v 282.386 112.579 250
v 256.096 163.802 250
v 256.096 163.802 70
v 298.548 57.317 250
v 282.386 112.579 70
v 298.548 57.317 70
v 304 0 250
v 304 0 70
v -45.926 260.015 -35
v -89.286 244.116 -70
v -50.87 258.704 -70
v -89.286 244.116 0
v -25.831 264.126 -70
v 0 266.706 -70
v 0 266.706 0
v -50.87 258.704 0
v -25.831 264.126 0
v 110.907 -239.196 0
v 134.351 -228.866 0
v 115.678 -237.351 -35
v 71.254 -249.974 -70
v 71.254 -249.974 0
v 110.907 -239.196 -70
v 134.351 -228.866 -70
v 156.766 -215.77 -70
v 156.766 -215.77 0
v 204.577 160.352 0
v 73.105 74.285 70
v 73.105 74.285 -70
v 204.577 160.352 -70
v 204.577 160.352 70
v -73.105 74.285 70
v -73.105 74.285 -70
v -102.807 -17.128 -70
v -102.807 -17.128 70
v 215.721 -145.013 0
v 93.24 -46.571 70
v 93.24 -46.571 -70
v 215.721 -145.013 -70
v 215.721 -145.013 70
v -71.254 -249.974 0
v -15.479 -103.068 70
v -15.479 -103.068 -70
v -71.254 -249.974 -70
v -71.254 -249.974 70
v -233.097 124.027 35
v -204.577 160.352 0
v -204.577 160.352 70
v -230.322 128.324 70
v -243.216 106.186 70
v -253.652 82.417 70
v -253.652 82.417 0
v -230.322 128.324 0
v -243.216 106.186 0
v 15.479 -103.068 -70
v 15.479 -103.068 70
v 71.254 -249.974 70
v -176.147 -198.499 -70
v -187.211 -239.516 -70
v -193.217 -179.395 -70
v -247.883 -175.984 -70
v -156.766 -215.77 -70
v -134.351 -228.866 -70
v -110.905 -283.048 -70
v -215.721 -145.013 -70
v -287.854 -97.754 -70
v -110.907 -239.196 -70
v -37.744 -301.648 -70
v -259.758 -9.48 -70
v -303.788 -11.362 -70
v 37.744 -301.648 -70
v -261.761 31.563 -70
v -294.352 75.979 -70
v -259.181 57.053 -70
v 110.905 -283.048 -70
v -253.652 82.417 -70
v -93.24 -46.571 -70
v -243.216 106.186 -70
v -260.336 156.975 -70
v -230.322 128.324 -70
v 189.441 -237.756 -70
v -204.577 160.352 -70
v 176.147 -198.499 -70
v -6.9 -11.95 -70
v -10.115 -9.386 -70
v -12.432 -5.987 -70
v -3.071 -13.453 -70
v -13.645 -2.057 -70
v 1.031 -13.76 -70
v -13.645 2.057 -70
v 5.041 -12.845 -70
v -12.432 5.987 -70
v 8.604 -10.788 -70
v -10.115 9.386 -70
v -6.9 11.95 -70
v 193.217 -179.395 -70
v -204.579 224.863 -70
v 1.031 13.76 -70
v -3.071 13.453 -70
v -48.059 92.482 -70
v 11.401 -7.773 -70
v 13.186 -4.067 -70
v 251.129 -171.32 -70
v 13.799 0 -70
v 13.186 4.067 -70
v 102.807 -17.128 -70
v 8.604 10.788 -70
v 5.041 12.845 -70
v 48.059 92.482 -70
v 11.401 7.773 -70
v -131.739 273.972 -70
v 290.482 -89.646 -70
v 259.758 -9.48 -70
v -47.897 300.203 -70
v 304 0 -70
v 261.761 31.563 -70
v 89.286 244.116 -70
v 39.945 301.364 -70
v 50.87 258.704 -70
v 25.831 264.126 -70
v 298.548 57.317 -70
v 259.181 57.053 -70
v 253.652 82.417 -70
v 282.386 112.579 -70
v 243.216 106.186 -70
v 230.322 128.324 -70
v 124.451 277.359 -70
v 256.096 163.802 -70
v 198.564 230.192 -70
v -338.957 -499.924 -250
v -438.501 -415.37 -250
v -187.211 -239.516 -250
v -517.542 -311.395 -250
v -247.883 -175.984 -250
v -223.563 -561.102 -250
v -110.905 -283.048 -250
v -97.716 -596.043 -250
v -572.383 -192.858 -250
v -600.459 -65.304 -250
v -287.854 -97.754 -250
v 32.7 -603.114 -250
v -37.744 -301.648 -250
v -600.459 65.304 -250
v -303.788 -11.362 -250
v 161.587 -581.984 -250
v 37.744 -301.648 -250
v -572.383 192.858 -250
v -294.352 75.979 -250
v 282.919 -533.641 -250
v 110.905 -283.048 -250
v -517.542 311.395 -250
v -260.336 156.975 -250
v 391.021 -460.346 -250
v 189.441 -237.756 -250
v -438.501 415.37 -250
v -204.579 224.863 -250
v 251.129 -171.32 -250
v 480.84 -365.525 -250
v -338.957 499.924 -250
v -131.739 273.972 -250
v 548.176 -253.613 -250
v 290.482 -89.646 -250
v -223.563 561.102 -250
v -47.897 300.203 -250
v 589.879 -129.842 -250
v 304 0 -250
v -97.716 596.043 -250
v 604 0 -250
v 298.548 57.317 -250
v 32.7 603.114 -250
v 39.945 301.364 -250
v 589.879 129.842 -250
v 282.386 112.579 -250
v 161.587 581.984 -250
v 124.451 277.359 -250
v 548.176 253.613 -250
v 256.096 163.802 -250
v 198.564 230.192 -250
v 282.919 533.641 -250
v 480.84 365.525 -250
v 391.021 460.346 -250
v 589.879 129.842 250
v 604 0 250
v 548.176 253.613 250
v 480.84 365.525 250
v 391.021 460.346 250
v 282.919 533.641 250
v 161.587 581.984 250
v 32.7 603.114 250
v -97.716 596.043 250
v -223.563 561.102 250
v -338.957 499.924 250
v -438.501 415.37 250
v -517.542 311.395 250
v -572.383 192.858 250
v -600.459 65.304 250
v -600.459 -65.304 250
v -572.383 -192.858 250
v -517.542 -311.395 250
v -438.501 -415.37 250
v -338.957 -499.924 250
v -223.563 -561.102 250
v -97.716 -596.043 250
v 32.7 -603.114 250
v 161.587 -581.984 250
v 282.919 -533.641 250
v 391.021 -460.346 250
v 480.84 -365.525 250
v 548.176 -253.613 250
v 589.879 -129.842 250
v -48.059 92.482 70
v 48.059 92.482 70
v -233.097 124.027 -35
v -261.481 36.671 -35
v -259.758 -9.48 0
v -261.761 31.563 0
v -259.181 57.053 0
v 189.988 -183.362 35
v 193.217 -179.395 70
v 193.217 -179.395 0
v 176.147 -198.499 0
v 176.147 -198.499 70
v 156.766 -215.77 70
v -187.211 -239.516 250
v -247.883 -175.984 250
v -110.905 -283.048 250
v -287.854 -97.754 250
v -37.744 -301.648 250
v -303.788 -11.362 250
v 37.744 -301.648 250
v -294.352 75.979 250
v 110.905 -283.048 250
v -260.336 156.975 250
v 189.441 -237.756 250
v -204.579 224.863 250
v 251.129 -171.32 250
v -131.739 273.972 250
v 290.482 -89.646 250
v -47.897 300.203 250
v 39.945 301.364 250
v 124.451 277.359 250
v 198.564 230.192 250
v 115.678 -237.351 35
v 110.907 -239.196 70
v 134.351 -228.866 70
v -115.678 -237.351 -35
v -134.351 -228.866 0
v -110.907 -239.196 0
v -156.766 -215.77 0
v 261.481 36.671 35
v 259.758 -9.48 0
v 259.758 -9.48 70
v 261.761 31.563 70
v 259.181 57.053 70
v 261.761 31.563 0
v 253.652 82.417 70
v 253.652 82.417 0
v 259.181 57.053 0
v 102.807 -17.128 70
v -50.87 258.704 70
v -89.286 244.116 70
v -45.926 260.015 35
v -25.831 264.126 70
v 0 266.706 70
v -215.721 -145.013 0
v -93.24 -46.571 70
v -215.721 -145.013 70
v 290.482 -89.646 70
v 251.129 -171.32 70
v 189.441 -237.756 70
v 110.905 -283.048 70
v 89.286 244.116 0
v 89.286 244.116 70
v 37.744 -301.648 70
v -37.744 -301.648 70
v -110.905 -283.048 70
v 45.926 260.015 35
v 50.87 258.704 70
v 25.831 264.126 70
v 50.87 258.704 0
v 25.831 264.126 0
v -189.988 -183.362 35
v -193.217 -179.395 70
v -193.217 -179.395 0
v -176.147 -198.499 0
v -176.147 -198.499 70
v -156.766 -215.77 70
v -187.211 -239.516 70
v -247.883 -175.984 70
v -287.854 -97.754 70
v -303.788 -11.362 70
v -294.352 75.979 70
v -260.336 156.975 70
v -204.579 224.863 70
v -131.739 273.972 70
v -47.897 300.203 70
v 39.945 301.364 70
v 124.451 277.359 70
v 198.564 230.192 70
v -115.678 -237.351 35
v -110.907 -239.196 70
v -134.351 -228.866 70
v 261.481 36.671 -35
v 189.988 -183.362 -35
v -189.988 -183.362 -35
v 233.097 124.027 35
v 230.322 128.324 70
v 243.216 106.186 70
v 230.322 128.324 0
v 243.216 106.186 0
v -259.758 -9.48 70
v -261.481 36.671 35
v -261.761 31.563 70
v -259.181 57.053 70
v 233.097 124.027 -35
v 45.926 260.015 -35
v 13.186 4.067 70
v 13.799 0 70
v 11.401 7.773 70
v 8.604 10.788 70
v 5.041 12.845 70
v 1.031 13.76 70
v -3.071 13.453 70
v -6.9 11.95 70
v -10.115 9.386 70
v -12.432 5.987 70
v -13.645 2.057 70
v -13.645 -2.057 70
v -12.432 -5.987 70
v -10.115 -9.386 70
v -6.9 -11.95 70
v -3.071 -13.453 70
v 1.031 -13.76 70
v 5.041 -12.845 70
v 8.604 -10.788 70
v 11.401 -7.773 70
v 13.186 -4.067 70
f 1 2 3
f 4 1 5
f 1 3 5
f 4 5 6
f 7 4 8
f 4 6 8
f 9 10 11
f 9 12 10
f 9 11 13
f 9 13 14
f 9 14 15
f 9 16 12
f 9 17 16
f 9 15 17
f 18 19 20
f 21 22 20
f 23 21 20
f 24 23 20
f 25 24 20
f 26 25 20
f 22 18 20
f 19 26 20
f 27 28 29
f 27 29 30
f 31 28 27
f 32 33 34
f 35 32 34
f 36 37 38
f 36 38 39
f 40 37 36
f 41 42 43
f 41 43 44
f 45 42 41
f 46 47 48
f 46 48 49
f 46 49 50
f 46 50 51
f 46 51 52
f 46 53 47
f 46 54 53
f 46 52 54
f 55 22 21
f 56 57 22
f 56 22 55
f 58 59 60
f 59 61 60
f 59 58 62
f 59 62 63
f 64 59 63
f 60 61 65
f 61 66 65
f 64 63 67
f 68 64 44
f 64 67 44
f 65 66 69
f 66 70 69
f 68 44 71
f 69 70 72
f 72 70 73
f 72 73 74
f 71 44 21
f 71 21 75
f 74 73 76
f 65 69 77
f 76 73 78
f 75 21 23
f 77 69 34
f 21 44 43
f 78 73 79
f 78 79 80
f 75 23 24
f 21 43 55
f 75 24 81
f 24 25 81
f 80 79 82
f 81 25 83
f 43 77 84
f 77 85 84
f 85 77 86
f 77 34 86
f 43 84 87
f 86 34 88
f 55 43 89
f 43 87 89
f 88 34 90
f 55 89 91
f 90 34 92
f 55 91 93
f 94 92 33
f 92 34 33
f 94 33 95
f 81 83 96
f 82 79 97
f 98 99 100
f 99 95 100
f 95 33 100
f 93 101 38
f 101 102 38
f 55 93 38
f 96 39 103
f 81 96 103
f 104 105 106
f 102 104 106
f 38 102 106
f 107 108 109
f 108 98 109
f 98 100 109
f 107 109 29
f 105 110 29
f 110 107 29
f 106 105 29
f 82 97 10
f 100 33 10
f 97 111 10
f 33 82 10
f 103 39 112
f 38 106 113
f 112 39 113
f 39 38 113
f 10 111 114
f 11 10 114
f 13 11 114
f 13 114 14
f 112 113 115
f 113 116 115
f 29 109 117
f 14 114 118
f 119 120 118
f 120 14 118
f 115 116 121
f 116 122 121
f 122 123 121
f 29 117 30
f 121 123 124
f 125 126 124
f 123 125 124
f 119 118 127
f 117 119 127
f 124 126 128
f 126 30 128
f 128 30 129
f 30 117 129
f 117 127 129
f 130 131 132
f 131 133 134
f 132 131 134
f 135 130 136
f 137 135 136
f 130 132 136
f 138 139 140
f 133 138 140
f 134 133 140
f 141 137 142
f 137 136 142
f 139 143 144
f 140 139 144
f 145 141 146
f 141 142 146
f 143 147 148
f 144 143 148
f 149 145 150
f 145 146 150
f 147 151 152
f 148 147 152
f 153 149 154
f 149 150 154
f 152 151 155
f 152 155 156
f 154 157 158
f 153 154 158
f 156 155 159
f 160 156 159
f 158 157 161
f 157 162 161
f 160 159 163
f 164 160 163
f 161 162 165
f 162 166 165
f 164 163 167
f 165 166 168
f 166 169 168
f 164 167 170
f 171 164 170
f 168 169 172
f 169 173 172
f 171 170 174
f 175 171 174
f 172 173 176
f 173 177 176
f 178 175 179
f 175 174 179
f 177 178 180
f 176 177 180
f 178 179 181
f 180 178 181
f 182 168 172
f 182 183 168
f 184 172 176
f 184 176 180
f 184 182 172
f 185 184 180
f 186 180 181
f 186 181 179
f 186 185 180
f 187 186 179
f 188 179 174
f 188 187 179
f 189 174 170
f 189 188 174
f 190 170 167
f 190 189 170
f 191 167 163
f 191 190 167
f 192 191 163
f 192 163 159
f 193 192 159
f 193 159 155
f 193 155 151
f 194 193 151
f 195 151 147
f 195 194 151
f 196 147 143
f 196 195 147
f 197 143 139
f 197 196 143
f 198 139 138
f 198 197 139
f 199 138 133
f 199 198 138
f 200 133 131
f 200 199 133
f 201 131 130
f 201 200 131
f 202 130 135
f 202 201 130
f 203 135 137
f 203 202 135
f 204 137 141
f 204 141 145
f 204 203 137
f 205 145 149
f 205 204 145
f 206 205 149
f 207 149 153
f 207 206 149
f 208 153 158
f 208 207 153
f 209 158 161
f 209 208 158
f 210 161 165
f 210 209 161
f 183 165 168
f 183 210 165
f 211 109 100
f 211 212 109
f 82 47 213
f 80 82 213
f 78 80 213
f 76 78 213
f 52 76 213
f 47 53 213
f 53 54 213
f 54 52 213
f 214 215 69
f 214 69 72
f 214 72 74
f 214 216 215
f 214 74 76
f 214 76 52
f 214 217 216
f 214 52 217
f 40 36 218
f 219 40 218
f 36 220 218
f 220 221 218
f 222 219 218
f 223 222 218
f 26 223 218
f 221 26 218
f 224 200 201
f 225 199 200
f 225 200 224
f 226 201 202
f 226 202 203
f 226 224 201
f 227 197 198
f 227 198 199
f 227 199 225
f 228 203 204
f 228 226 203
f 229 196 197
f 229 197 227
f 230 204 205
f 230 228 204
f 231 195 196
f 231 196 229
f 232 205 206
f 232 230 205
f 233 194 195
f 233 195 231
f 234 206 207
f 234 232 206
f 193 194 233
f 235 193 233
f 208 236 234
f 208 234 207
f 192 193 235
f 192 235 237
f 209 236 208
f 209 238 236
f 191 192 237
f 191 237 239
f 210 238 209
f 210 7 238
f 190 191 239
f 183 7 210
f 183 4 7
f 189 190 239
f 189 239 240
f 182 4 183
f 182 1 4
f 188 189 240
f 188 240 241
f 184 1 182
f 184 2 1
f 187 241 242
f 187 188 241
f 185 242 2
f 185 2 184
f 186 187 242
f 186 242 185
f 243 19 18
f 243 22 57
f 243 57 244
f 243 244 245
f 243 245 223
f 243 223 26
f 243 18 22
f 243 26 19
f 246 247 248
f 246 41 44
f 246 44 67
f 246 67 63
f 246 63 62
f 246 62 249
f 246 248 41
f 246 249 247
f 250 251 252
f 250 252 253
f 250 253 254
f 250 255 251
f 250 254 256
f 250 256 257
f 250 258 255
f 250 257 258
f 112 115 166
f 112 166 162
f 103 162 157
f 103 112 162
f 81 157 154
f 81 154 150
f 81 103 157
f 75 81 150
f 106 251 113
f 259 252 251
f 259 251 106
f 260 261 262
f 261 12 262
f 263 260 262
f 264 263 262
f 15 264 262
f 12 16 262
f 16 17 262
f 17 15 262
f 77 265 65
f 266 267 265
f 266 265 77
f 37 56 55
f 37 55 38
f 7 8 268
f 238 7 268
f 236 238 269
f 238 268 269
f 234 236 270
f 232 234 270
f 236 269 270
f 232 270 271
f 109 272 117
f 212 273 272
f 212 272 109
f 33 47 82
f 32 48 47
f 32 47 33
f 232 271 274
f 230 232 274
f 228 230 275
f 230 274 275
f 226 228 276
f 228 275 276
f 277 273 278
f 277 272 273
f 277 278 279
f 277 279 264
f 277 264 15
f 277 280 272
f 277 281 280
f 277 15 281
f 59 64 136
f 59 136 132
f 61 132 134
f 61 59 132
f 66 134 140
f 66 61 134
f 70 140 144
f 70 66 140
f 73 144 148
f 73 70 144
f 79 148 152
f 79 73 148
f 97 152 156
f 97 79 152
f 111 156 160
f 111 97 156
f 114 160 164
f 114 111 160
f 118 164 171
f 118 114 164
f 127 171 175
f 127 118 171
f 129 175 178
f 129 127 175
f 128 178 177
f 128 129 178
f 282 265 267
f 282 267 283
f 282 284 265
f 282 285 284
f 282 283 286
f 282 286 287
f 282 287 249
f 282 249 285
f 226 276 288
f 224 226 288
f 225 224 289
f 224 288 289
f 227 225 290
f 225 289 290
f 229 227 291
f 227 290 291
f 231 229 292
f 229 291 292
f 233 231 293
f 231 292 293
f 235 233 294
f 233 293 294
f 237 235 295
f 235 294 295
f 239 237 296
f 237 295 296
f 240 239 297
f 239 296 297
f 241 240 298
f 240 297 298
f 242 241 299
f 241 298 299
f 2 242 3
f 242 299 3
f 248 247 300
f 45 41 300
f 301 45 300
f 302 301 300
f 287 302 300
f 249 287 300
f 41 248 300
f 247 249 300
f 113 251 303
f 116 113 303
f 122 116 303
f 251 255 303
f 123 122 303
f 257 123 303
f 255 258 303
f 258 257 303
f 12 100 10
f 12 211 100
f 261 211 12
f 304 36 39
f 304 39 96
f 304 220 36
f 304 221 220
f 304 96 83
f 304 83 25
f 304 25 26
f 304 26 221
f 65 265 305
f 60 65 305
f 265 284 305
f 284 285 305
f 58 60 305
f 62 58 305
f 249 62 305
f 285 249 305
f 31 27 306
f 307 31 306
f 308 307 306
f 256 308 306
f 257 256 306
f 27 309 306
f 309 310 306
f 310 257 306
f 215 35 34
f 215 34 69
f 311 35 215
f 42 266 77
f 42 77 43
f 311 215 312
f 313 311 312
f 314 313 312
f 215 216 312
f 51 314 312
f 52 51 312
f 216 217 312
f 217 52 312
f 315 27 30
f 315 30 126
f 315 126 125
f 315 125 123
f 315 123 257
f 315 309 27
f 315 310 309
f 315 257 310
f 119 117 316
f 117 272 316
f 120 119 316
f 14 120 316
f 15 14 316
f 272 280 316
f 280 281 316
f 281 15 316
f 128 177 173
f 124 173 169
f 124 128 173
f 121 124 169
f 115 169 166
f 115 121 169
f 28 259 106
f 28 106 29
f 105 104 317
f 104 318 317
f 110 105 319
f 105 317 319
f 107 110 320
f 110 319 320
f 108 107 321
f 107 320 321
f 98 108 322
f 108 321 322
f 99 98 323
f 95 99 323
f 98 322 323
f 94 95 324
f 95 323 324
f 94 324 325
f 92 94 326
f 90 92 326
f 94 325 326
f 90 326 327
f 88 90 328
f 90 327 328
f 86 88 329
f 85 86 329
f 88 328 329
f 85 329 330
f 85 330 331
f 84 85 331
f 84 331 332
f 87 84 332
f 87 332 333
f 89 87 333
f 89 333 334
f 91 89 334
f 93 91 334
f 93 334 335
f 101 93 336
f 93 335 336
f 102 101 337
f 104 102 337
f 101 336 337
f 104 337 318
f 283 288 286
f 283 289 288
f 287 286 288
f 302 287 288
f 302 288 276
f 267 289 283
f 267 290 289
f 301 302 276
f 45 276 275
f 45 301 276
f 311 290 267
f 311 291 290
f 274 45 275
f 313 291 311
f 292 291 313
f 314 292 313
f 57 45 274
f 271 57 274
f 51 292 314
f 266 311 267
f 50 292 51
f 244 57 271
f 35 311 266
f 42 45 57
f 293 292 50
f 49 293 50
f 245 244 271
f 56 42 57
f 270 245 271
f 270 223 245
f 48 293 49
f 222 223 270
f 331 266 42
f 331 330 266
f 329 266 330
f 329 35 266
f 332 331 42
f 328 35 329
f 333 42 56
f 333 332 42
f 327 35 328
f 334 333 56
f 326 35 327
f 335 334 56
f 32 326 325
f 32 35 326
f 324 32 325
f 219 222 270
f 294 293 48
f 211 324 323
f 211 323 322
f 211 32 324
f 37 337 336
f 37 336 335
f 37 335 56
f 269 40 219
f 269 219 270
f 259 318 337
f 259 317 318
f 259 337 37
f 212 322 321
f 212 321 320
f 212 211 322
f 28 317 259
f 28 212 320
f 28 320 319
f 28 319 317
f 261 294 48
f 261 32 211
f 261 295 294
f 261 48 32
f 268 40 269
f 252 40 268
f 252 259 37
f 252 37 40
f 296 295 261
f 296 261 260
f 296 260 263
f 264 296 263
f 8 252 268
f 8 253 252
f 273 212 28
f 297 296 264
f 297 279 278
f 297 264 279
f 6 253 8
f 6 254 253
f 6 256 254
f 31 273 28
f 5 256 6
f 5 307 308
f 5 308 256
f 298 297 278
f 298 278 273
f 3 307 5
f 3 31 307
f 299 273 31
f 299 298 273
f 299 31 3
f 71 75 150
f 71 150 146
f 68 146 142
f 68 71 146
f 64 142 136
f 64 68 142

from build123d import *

# Parameters (mm, degrees)
SKETCH1_R                = 604
BOSS_EXTRUDE1_DEPTH      = 250
BOSS_EXTRUDE1_DEPTH_BACK = 250
BOSS_EXTRUDE2_DEPTH      = 70
BOSS_EXTRUDE2_DEPTH_BACK = 70
SKETCH2_R                = 13.799006552
CUT_EXTRUDE1_DEPTH       = 251
CUT_EXTRUDE1_DEPTH_BACK  = 80


with BuildPart() as part:
    # Sketch1 → Boss-Extrude1 (new body, two sides)
    with BuildSketch(Plane.XY) as boss_extrude1_sk:
        Circle(SKETCH1_R)
        with BuildLine():
            ThreePointArc((110.905261025, -283.047739926), (0, -304), (-110.905261025, -283.047739926))
            ThreePointArc((-110.905261025, -283.047739926), (-289.121180954, -93.94116629), (-256.095528158, 163.801954987))
            ThreePointArc((-256.095528158, 163.801954987), (0, 304), (256.095528158, 163.801954987))
            ThreePointArc((256.095528158, 163.801954987), (291.778203915, 85.331586883), (304, 0))
            ThreePointArc((304, 0), (251.128651643, -171.319585349), (110.905261025, -283.047739926))
        make_face(mode=Mode.SUBTRACT)
    extrude(amount=BOSS_EXTRUDE1_DEPTH)
    extrude(boss_extrude1_sk.sketch, amount=-BOSS_EXTRUDE1_DEPTH_BACK)

    # Sketch1<3> → Boss-Extrude2 (add, two sides)
    with BuildSketch(Plane.XY) as boss_extrude2_sk:
        with BuildLine():
            ThreePointArc((-256.095528158, 163.801954987), (-289.121180954, -93.94116629), (-110.905261025, -283.047739926))
            ThreePointArc((-110.905261025, -283.047739926), (0, -304), (110.905261025, -283.047739926))
            ThreePointArc((110.905261025, -283.047739926), (251.128651643, -171.319585349), (304, 0))
            ThreePointArc((304, 0), (291.778203915, 85.331586883), (256.095528158, 163.801954987))
            ThreePointArc((256.095528158, 163.801954987), (0, 304), (-256.095528158, 163.801954987))
        make_face()
        with BuildLine():
            Line((-215.721149564, -145.012778765), (-93.240227923, -46.571430252))
            Line((-93.240227923, -46.571430252), (-15.479247226, -103.068089747))
            Line((-15.479247226, -103.068089747), (-71.253846929, -249.974418035))
            add(Edge.make_bspline(
                [(-71.253846929, -249.974418035), (-117.347044344, -241.830887845), (-156.765760089, -215.769557936)],
                knots=[0, 0, 0, 1, 1, 1], degree=2))
            add(Edge.make_bspline(
                [(-215.721149564, -145.012778765), (-193.732610785, -186.3335253), (-156.765760089, -215.769557936)],
                knots=[0, 0, 0, 1, 1, 1], degree=2))
        make_face(mode=Mode.SUBTRACT)
        with BuildLine():
            Line((71.253846929, -249.974418035), (15.479247226, -103.068089747))
            Line((15.479247226, -103.068089747), (93.240227923, -46.571430252))
            Line((93.240227923, -46.571430252), (215.721149564, -145.012778765))
            add(Edge.make_bspline(
                [(215.721149564, -145.012778765), (193.732610785, -186.3335253), (156.765760089, -215.769557936)],
                knots=[0, 0, 0, 1, 1, 1], degree=2))
            add(Edge.make_bspline(
                [(71.253846929, -249.974418035), (117.347044344, -241.830887845), (156.765760089, -215.769557936)],
                knots=[0, 0, 0, 1, 1, 1], degree=2))
        make_face(mode=Mode.SUBTRACT)
        with BuildLine():
            Line((-204.576849452, 160.351591955), (-73.104877202, 74.285362947))
            Line((-73.104877202, 74.285362947), (-102.806928829, -17.128152368))
            Line((-102.806928829, -17.128152368), (-259.758448795, -9.479907899))
            add(Edge.make_bspline(
                [(-259.758448795, -9.479907899), (-266.257072669, 36.873817082), (-253.652328097, 82.416637394)],
                knots=[0, 0, 0, 1, 1, 1], degree=2))
            add(Edge.make_bspline(
                [(-204.576849452, 160.351591955), (-237.080382538, 126.670435966), (-253.652328097, 82.416637394)],
                knots=[0, 0, 0, 1, 1, 1], degree=2))
        make_face(mode=Mode.SUBTRACT)
        with BuildLine():
            Line((259.758448795, -9.479907899), (102.806928829, -17.128152368))
            Line((102.806928829, -17.128152368), (73.104877202, 74.285362947))
            Line((73.104877202, 74.285362947), (204.576849452, 160.351591955))
            add(Edge.make_bspline(
                [(204.576849452, 160.351591955), (237.080382538, 126.670435966), (253.652328097, 82.416637394)],
                knots=[0, 0, 0, 1, 1, 1], degree=2))
            add(Edge.make_bspline(
                [(259.758448795, -9.479907899), (266.257072669, 36.873817082), (253.652328097, 82.416637394)],
                knots=[0, 0, 0, 1, 1, 1], degree=2))
        make_face(mode=Mode.SUBTRACT)
        with BuildLine():
            Line((89.285703291, 244.115512743), (48.058929069, 92.48230942))
            Line((48.058929069, 92.48230942), (-48.058929069, 92.48230942))
            Line((-48.058929069, 92.48230942), (-89.285703291, 244.115512743))
            add(Edge.make_bspline(
                [(-89.285703291, 244.115512743), (-47.20887631, 264.620160097), (0, 266.705841084)],
                knots=[0, 0, 0, 1, 1, 1], degree=2))
            add(Edge.make_bspline(
                [(89.285703291, 244.115512743), (47.20887631, 264.620160097), (0, 266.705841084)],
                knots=[0, 0, 0, 1, 1, 1], degree=2))
        make_face(mode=Mode.SUBTRACT)
    extrude(amount=BOSS_EXTRUDE2_DEPTH)
    extrude(boss_extrude2_sk.sketch, amount=-BOSS_EXTRUDE2_DEPTH_BACK)

    # Sketch2 → Cut-Extrude1 (cut, two sides)
    with BuildSketch(Plane.XY) as cut_extrude1_sk:
        Circle(SKETCH2_R)
    extrude(amount=CUT_EXTRUDE1_DEPTH, mode=Mode.SUBTRACT)
    extrude(cut_extrude1_sk.sketch, amount=-CUT_EXTRUDE1_DEPTH_BACK, mode=Mode.SUBTRACT)


solid = part.part
